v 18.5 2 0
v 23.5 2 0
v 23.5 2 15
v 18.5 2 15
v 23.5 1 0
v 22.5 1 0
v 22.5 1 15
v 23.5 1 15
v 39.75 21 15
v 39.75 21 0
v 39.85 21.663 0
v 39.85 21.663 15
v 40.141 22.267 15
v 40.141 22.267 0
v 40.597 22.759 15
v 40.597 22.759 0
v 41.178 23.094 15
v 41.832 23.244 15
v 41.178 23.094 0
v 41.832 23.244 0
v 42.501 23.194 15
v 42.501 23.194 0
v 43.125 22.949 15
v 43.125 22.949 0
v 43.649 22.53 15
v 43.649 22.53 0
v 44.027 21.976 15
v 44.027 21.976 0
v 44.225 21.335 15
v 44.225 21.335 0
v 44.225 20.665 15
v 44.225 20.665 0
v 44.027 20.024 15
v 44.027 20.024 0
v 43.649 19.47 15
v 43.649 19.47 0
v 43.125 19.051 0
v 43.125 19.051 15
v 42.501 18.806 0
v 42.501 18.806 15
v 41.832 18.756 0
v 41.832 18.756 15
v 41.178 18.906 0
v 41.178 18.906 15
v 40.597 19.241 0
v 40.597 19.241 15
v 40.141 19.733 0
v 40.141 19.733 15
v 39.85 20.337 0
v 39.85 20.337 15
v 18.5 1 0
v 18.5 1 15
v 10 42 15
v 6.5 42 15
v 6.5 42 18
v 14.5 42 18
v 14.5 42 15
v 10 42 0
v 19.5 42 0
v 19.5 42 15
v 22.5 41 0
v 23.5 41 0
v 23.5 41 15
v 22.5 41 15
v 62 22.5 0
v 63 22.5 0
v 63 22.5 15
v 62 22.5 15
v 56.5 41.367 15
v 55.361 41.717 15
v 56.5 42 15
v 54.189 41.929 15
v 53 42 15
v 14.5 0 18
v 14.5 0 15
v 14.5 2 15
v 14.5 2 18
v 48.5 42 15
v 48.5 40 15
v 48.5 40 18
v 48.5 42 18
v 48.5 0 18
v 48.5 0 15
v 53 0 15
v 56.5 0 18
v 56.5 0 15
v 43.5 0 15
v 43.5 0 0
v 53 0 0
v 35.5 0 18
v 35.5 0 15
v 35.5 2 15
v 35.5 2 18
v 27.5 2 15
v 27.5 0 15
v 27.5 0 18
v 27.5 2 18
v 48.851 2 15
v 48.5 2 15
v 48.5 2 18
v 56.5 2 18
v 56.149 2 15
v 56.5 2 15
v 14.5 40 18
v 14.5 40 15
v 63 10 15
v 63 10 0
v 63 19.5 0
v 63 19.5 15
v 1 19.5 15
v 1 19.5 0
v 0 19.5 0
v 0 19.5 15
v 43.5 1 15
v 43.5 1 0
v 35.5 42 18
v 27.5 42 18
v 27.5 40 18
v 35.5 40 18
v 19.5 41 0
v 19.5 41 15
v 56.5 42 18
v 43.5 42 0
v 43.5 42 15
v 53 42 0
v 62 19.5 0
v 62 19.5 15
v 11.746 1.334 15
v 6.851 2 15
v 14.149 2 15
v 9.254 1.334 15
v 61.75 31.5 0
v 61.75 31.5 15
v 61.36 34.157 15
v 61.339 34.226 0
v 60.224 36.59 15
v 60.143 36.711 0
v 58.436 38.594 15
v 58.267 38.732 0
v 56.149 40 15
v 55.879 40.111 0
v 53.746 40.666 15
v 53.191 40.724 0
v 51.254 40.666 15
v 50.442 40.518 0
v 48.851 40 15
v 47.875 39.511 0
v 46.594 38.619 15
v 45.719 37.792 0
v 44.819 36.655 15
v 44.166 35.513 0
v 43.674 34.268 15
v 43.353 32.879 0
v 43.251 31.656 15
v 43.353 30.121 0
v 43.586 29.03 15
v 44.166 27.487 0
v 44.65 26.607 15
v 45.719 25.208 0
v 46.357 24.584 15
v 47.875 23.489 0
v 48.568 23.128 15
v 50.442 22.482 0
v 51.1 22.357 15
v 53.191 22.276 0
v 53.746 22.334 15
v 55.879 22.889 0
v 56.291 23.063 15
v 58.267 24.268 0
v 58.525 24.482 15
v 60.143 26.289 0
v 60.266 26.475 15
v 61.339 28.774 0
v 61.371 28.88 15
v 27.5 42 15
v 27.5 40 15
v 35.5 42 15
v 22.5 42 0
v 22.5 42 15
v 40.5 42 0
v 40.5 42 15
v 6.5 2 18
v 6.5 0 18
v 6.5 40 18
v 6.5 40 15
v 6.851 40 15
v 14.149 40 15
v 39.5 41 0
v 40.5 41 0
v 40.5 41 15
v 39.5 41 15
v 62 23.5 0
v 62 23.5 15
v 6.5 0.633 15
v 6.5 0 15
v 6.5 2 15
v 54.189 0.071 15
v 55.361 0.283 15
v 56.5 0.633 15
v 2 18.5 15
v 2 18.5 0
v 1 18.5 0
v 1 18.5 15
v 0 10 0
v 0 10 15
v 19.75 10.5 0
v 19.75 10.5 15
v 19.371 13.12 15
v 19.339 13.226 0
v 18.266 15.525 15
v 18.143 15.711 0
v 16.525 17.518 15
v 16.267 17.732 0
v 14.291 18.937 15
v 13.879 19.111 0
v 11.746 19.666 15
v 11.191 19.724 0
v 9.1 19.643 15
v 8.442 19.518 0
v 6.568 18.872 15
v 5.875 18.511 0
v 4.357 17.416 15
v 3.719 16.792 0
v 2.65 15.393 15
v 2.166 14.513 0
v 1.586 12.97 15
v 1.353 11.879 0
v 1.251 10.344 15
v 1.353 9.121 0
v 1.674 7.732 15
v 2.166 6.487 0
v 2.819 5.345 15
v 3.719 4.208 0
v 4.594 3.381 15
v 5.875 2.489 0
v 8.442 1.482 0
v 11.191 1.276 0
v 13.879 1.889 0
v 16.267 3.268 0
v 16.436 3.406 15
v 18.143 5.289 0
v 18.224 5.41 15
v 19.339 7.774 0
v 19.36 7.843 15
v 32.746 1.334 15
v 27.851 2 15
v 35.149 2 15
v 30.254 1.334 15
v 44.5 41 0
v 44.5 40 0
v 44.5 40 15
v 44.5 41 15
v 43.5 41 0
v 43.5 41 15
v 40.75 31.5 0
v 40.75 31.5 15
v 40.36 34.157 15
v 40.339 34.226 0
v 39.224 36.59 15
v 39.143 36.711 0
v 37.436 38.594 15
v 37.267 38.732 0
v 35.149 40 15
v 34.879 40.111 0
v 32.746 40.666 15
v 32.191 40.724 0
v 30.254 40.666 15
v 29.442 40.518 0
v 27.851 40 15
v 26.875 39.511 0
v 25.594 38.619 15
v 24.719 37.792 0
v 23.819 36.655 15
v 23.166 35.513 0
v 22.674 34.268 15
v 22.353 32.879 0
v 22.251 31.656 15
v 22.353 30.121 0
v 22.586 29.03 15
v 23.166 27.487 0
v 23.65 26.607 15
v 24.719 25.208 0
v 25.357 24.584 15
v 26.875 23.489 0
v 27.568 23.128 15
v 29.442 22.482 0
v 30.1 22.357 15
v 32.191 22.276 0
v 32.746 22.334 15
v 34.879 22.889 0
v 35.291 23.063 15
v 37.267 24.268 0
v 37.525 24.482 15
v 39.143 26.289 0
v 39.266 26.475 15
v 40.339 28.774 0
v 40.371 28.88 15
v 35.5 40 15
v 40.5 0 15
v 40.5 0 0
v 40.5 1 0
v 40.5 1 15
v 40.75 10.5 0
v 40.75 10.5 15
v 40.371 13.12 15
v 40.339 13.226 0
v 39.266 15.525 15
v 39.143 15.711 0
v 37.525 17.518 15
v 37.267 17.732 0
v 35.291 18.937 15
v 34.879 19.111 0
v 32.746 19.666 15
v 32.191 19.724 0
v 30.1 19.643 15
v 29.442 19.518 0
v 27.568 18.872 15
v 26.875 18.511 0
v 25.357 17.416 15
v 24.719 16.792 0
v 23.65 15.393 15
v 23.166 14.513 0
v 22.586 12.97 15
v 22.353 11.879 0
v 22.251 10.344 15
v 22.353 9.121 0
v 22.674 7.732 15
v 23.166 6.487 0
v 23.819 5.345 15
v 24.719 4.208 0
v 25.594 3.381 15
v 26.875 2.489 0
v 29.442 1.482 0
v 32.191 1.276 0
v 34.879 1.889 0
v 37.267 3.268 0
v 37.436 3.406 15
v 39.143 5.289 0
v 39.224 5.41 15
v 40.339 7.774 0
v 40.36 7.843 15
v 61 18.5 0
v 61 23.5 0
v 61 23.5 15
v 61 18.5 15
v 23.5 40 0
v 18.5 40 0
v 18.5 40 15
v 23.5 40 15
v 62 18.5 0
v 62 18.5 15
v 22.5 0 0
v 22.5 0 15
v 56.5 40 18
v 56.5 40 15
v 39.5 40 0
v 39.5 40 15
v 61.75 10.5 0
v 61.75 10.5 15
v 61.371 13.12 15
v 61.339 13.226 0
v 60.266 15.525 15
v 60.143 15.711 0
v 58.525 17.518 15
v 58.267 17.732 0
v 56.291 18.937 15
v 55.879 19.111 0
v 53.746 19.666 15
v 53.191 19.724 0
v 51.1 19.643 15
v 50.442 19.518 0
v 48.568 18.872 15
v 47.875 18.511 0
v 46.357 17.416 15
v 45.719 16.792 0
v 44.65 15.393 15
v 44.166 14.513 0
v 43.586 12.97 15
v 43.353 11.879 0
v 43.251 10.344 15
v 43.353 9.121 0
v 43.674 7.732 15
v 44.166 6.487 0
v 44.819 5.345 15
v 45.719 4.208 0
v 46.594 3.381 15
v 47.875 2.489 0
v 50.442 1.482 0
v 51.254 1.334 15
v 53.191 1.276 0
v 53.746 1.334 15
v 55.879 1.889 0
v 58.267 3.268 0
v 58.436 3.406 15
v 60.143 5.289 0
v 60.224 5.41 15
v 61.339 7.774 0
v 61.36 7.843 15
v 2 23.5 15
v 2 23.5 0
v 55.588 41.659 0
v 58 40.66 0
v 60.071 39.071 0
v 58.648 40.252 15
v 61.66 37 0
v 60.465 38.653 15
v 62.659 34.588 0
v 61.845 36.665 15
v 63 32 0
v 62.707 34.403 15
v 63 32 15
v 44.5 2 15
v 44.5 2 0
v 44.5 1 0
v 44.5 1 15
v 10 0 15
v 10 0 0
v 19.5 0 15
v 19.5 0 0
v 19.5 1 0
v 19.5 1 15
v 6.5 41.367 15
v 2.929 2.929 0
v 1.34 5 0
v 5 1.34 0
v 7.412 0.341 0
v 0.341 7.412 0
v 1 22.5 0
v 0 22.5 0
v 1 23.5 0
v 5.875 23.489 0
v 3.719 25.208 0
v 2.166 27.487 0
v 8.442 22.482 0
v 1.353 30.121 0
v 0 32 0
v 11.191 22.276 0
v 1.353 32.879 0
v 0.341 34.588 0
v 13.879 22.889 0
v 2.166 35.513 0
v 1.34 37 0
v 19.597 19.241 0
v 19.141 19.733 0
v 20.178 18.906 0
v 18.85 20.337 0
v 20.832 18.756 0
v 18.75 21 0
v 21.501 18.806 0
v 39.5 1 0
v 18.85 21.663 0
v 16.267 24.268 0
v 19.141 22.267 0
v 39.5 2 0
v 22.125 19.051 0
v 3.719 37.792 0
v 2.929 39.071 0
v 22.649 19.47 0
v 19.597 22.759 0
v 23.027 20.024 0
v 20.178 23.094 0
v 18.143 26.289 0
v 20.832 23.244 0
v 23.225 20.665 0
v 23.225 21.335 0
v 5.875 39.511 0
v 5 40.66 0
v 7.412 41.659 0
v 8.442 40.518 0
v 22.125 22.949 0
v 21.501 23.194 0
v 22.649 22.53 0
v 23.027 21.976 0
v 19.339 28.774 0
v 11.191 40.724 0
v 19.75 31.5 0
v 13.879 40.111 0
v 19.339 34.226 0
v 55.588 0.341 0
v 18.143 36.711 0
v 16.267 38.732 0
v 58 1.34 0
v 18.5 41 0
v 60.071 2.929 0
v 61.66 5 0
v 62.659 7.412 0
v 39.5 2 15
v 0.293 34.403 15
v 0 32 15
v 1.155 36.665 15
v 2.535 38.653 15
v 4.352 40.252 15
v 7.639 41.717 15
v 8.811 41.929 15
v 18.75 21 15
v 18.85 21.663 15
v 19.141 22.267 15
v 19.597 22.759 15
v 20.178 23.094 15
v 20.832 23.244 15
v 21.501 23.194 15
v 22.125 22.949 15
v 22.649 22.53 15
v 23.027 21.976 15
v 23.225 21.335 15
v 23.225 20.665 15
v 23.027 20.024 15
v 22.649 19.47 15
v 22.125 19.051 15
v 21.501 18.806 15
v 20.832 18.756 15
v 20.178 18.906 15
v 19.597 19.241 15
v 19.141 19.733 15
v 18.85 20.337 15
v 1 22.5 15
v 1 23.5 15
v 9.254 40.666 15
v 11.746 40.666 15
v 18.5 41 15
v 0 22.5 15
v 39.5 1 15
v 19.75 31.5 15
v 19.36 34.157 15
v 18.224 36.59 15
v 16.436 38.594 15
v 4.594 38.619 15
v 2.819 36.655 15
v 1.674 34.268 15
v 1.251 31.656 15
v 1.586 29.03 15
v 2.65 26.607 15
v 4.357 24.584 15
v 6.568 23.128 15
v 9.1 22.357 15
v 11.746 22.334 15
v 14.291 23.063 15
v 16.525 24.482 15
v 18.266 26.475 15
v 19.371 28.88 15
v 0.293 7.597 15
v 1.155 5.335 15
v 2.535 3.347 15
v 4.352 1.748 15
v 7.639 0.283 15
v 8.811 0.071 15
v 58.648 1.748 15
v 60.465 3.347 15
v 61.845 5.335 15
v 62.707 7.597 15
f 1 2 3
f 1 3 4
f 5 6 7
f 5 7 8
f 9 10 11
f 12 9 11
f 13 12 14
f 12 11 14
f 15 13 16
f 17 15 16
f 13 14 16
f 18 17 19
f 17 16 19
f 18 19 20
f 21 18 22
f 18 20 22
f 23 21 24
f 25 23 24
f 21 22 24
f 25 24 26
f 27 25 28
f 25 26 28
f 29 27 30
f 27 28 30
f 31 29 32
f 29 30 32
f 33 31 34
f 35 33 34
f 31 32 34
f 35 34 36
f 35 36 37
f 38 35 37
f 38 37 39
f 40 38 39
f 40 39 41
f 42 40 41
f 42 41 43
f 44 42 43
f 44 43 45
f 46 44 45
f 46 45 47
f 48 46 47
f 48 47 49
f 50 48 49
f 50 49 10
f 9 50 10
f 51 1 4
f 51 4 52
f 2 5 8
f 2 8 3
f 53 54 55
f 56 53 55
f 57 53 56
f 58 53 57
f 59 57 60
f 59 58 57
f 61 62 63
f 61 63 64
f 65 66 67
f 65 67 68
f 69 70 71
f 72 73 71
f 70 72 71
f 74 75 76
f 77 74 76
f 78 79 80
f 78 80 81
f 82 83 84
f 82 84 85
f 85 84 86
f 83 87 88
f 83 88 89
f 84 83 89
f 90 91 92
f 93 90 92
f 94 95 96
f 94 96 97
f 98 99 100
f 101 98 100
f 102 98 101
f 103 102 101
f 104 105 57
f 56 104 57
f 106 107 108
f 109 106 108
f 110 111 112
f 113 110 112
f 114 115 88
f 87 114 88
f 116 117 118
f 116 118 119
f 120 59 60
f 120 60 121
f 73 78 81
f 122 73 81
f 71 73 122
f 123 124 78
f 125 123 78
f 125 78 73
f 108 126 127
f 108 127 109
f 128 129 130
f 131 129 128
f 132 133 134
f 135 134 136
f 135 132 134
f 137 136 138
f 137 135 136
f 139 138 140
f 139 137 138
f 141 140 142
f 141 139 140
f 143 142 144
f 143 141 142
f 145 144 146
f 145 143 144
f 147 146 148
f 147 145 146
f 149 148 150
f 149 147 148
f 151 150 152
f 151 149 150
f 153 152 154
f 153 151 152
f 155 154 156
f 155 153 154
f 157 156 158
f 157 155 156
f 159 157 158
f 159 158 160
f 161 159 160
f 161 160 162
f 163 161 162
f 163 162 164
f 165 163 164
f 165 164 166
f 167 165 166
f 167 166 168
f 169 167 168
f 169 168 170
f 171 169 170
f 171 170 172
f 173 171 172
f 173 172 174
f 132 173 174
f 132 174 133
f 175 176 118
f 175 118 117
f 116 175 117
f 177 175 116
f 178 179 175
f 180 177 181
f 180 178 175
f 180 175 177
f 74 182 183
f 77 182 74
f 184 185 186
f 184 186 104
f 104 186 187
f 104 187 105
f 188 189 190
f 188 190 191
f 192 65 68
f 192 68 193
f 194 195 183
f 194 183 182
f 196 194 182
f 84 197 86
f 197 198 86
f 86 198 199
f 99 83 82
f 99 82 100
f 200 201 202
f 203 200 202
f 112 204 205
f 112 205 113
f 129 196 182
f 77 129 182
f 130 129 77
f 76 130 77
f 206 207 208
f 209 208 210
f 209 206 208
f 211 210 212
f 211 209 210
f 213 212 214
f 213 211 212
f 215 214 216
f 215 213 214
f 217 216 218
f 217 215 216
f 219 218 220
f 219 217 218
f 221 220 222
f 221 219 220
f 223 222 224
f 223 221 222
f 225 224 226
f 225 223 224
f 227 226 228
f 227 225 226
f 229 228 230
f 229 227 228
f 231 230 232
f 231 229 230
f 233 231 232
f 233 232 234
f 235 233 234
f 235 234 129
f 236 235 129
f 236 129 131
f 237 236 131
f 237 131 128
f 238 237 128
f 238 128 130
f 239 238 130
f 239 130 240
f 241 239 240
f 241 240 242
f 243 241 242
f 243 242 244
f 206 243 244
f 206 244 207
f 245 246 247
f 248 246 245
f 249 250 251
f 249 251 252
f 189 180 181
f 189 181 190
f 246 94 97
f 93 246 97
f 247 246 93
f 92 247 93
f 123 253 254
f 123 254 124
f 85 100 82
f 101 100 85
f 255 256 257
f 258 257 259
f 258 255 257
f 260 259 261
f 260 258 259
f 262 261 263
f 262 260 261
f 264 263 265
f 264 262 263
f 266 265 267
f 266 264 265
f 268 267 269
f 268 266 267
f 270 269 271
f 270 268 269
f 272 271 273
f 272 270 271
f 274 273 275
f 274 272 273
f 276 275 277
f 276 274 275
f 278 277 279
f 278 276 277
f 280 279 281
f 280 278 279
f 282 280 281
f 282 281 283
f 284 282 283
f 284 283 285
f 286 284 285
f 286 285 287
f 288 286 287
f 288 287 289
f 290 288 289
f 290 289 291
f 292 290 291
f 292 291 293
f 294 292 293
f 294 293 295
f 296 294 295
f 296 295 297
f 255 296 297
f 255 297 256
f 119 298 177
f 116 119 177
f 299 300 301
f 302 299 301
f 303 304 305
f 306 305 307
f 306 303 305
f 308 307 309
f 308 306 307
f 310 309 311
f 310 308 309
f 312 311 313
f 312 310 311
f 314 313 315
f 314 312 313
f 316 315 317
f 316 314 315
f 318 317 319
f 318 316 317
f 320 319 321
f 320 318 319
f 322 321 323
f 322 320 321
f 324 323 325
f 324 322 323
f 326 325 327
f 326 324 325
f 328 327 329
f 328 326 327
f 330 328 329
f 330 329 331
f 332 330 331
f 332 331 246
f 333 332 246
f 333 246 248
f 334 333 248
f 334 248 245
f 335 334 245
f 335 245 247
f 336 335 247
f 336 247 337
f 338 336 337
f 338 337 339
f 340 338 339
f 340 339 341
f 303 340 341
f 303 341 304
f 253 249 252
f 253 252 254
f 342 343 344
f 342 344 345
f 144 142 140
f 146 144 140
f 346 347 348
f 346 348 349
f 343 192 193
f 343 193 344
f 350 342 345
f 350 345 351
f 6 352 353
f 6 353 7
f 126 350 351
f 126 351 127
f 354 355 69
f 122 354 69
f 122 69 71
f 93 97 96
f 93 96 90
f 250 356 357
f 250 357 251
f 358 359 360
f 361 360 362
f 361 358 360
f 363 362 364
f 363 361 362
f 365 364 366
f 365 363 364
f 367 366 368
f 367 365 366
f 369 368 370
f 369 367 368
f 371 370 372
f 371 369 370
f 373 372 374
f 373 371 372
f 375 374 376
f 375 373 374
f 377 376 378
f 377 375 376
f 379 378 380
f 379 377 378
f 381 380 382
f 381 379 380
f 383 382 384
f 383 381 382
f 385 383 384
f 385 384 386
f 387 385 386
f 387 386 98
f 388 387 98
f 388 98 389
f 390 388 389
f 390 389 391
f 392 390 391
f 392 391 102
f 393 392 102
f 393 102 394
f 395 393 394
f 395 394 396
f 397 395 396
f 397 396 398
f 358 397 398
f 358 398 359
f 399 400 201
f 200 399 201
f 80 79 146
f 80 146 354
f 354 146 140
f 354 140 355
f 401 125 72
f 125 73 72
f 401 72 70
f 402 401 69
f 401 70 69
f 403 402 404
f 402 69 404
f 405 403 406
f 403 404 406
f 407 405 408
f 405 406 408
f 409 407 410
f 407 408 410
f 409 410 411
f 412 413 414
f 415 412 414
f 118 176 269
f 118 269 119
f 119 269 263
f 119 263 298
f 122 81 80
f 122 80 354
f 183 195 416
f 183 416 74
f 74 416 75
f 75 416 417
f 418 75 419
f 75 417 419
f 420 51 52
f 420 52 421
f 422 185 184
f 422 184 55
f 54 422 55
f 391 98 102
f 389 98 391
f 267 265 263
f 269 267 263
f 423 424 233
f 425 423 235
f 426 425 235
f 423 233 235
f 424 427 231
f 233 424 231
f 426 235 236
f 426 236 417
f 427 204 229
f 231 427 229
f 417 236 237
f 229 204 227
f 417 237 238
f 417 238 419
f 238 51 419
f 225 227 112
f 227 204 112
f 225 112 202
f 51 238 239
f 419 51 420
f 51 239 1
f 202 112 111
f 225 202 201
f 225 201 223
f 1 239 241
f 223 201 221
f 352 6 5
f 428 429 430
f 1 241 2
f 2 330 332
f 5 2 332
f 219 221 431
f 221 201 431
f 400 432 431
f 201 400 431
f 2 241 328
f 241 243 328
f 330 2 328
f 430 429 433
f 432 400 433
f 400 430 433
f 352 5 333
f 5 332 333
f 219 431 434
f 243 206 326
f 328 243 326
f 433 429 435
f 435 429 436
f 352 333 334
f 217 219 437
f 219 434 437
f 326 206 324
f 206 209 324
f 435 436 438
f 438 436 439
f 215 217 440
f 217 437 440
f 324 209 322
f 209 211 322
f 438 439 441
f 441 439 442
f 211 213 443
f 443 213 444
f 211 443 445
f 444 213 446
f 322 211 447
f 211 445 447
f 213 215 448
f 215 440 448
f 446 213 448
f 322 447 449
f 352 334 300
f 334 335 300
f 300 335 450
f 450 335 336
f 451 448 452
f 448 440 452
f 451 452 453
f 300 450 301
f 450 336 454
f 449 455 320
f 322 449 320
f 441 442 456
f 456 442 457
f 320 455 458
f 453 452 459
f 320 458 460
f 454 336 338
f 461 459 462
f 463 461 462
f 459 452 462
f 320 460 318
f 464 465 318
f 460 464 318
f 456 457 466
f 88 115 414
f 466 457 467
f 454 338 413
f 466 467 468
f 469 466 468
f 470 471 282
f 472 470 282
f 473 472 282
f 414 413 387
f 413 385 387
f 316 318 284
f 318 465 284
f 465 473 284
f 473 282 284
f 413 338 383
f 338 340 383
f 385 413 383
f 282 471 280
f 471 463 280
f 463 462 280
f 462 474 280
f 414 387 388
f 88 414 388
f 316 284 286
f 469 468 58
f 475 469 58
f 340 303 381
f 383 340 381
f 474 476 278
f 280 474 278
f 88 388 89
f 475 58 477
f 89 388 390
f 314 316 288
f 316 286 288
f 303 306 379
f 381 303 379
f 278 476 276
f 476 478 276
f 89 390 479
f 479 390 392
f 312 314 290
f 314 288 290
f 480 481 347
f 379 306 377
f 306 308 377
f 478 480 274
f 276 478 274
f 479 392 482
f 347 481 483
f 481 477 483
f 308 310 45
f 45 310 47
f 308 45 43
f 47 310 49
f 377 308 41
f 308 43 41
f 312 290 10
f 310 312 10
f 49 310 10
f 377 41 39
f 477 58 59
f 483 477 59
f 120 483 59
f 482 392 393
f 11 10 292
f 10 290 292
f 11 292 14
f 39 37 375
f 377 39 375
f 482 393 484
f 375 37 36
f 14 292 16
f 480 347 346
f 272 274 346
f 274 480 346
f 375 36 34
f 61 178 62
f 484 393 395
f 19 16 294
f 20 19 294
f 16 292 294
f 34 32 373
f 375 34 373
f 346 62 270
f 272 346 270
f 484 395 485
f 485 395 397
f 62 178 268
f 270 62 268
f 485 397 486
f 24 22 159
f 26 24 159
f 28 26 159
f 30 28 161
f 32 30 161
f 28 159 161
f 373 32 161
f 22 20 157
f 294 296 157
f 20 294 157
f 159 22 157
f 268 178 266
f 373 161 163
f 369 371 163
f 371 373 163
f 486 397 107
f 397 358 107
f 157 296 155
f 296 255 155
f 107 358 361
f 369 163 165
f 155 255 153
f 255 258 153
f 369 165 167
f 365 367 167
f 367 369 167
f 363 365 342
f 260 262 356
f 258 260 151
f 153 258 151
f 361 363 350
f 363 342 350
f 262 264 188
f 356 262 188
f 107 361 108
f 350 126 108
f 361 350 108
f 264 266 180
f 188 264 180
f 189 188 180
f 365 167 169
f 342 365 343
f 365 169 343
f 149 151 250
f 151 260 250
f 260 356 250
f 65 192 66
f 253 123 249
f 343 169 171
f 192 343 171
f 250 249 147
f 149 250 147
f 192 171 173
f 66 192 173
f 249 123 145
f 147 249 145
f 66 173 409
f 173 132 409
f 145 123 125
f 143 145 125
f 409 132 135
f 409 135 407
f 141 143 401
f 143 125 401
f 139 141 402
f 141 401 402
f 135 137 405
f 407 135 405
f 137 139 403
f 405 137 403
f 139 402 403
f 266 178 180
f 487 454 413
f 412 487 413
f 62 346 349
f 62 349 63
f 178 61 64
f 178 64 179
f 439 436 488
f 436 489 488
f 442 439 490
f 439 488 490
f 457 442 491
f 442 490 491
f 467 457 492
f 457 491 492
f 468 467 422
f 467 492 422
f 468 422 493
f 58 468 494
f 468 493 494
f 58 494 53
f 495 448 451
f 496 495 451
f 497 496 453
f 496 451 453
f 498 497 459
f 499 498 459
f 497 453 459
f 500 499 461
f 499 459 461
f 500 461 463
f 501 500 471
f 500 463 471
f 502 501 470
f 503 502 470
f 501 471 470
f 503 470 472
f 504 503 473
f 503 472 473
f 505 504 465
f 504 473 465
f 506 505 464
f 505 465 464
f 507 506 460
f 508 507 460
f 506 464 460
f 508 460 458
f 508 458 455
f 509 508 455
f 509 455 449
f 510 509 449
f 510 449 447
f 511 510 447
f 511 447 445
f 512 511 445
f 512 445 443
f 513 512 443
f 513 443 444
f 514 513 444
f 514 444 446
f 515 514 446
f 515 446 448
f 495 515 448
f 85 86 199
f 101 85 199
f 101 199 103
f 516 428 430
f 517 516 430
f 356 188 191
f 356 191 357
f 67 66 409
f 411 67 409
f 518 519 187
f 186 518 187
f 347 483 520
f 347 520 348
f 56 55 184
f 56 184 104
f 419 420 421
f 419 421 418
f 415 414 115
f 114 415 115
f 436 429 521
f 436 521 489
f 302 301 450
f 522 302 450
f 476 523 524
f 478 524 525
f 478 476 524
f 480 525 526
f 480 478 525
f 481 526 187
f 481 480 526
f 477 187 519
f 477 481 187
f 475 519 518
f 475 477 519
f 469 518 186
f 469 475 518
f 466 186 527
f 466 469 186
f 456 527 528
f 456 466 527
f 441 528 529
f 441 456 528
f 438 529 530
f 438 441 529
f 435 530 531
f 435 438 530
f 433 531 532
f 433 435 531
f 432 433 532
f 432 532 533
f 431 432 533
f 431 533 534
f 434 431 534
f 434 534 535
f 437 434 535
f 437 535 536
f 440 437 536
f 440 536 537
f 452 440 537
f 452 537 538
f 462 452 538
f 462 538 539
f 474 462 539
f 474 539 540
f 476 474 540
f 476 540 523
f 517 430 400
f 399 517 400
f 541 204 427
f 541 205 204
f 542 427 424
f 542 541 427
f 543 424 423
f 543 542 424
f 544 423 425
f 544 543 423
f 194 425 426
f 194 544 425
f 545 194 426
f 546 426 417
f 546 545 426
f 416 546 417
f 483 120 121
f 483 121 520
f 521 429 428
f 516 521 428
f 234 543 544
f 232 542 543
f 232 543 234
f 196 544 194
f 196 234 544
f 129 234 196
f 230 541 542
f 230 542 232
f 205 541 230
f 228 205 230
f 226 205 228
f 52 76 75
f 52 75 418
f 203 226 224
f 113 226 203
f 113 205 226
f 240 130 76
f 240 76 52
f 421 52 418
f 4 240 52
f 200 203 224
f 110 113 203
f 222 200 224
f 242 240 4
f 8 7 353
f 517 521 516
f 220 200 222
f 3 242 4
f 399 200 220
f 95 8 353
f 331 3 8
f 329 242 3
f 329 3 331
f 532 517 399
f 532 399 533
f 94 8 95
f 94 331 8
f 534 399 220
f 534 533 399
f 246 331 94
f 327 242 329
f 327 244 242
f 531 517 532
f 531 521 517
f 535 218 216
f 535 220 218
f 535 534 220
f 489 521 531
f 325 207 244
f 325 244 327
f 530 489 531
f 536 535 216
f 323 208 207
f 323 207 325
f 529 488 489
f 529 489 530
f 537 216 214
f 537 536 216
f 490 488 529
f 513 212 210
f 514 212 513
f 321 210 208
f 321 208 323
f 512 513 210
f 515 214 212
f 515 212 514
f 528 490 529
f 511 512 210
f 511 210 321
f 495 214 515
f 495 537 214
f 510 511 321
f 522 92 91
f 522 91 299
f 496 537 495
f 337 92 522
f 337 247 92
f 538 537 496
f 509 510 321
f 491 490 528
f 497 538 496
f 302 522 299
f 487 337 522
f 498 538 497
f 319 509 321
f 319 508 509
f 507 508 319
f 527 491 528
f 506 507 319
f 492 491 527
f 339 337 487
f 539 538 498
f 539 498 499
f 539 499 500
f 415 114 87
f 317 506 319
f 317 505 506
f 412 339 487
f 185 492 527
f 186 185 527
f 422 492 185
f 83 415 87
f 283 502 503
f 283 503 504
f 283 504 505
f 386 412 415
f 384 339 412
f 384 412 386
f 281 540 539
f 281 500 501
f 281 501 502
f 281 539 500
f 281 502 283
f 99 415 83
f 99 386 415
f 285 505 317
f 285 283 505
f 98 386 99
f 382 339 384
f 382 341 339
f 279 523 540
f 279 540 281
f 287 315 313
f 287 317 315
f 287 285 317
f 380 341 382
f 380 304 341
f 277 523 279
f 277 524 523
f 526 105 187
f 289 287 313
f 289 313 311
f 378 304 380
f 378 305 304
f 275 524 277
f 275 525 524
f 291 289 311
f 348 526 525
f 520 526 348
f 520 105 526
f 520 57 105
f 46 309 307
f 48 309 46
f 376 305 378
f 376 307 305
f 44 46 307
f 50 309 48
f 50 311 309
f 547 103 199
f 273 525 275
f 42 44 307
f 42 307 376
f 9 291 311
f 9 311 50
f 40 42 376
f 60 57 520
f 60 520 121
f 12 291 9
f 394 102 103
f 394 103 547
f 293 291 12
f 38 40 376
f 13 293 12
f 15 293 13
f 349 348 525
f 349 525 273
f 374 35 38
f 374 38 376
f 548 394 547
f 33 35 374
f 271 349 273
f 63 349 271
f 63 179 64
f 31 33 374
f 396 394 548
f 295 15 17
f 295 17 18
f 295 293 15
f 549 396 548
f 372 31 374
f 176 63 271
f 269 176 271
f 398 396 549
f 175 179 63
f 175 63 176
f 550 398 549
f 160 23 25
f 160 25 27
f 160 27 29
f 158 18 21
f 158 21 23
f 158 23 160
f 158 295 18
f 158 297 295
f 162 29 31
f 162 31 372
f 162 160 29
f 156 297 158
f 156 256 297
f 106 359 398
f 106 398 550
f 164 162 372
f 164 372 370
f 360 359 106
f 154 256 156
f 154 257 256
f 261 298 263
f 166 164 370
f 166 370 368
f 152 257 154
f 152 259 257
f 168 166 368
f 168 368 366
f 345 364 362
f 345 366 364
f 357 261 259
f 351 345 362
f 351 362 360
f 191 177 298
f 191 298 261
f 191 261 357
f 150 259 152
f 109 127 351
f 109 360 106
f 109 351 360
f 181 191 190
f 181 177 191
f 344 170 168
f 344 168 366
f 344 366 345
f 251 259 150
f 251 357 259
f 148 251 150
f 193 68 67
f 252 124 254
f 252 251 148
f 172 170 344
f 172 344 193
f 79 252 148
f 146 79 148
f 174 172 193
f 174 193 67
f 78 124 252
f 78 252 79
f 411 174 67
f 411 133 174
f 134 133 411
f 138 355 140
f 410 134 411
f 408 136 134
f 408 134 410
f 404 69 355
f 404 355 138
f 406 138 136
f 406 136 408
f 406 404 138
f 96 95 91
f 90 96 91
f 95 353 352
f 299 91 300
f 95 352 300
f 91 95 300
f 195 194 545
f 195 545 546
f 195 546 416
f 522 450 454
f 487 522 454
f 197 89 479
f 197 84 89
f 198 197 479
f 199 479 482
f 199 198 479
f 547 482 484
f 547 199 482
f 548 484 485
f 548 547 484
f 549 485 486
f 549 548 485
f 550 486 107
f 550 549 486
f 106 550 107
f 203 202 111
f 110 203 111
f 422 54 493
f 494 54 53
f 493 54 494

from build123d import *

# Parameters (mm, degrees)
SKETCH1_W            = 63
SKETCH1_H            = 42
SKETCH1_R            = 9.25
BOSS_EXTRUDE1_DEPTH  = 15
FILLET1_R            = 10
SKETCH3_W            = 8
SKETCH3_H            = 2
BOSS_EXTRUDE2_DEPTH  = 7
M4_CLEARANCE_HOLE1_D = 4.5
CUT_EXTRUDE1_DEPTH   = 23
SKETCH7_W            = 116.08326012
SKETCH7_H            = 87.262251834
CUT_EXTRUDE2_DEPTH   = 4


with BuildPart() as part:
    # Sketch1 → Boss-Extrude1 (new body)
    with BuildSketch(Plane.XY):
        with Locations((31.5, 21)):
            Rectangle(SKETCH1_W, SKETCH1_H)
        with Locations((10.5, 31.5)):
            Circle(SKETCH1_R, mode=Mode.SUBTRACT)
        with Locations((10.5, 10.5)):
            Circle(SKETCH1_R, mode=Mode.SUBTRACT)
        with Locations((52.5, 31.5)):
            Circle(SKETCH1_R, mode=Mode.SUBTRACT)
        with Locations((52.5, 10.5)):
            Circle(SKETCH1_R, mode=Mode.SUBTRACT)
        with Locations((31.5, 31.5)):
            Circle(SKETCH1_R, mode=Mode.SUBTRACT)
        with Locations((31.5, 10.5)):
            Circle(SKETCH1_R, mode=Mode.SUBTRACT)
    extrude(amount=BOSS_EXTRUDE1_DEPTH)

    # Fillet1
    fillet1_edges = [part.edges().sort_by_distance(p)[0] for p in [
        (0, 42, 7.5),
        (63, 42, 7.5),
        (63, 0, 7.5),
        (0, 0, 7.5),
    ]]
    fillet(fillet1_edges, radius=FILLET1_R)

    # Sketch3 → Boss-Extrude2 (add)
    with BuildSketch(Plane.XY.offset(15)):
        with Locations((31.5, 1)):
            Rectangle(SKETCH3_W, SKETCH3_H)
        with Locations((52.5, 1)):
            Rectangle(SKETCH3_W, SKETCH3_H)
        with Locations((10.5, 1)):
            Rectangle(SKETCH3_W, SKETCH3_H)
        with Locations((10.5, 41)):
            Rectangle(SKETCH3_W, SKETCH3_H)
        with Locations((31.5, 41)):
            Rectangle(SKETCH3_W, SKETCH3_H)
        with Locations((52.5, 41)):
            Rectangle(SKETCH3_W, SKETCH3_H)
    extrude(amount=BOSS_EXTRUDE2_DEPTH)

    # M4 Clearance Hole1 (through all)
    with Locations(Plane.XY.offset(15)):
        with Locations((21, 21), (42, 21)):
            Hole(M4_CLEARANCE_HOLE1_D / 2)

    # Sketch6 → Cut-Extrude1 (cut, through all)
    with BuildSketch(Plane(origin=(0, 0, 0), x_dir=(-1, 0, 0), z_dir=(0, 0, -1))):
        Polygon((-40.5, 41), (-39.5, 41), (-39.5, 40), (-44.5, 40), (-44.5, 41), (-43.5, 41), (-43.5, 42), (-40.5, 42), align=None)
        Polygon((-19.5, 41), (-18.5, 41), (-18.5, 40), (-23.5, 40), (-23.5, 41), (-22.5, 41), (-22.5, 42), (-19.5, 42), align=None)
        Polygon((-44.5, 1), (-43.5, 1), (-43.5, 0), (-40.5, 0), (-40.5, 1), (-39.5, 1), (-39.5, 2), (-44.5, 2), align=None)
        Polygon((-18.5, 2), (-18.5, 1), (-19.5, 1), (-19.5, 0), (-22.5, 0), (-22.5, 1), (-23.5, 1), (-23.5, 2), align=None)
        Polygon((-62, 19.5), (-63, 19.5), (-63, 22.5), (-62, 22.5), (-62, 23.5), (-61, 23.5), (-61, 18.5), (-62, 18.5), align=None)
        Polygon((-1, 22.5), (-1, 23.5), (-2, 23.5), (-2, 18.5), (-1, 18.5), (-1, 19.5), (0, 19.5), (0, 22.5), align=None)
    extrude(amount=-CUT_EXTRUDE1_DEPTH, mode=Mode.SUBTRACT)

    # Sketch7 → Cut-Extrude2 (cut)
    with BuildSketch(Plane.XY.offset(22)):
        with Locations((31.5, 10.5)):
            Rectangle(SKETCH7_W, SKETCH7_H)
    extrude(amount=-CUT_EXTRUDE2_DEPTH, mode=Mode.SUBTRACT)


solid = part.part
